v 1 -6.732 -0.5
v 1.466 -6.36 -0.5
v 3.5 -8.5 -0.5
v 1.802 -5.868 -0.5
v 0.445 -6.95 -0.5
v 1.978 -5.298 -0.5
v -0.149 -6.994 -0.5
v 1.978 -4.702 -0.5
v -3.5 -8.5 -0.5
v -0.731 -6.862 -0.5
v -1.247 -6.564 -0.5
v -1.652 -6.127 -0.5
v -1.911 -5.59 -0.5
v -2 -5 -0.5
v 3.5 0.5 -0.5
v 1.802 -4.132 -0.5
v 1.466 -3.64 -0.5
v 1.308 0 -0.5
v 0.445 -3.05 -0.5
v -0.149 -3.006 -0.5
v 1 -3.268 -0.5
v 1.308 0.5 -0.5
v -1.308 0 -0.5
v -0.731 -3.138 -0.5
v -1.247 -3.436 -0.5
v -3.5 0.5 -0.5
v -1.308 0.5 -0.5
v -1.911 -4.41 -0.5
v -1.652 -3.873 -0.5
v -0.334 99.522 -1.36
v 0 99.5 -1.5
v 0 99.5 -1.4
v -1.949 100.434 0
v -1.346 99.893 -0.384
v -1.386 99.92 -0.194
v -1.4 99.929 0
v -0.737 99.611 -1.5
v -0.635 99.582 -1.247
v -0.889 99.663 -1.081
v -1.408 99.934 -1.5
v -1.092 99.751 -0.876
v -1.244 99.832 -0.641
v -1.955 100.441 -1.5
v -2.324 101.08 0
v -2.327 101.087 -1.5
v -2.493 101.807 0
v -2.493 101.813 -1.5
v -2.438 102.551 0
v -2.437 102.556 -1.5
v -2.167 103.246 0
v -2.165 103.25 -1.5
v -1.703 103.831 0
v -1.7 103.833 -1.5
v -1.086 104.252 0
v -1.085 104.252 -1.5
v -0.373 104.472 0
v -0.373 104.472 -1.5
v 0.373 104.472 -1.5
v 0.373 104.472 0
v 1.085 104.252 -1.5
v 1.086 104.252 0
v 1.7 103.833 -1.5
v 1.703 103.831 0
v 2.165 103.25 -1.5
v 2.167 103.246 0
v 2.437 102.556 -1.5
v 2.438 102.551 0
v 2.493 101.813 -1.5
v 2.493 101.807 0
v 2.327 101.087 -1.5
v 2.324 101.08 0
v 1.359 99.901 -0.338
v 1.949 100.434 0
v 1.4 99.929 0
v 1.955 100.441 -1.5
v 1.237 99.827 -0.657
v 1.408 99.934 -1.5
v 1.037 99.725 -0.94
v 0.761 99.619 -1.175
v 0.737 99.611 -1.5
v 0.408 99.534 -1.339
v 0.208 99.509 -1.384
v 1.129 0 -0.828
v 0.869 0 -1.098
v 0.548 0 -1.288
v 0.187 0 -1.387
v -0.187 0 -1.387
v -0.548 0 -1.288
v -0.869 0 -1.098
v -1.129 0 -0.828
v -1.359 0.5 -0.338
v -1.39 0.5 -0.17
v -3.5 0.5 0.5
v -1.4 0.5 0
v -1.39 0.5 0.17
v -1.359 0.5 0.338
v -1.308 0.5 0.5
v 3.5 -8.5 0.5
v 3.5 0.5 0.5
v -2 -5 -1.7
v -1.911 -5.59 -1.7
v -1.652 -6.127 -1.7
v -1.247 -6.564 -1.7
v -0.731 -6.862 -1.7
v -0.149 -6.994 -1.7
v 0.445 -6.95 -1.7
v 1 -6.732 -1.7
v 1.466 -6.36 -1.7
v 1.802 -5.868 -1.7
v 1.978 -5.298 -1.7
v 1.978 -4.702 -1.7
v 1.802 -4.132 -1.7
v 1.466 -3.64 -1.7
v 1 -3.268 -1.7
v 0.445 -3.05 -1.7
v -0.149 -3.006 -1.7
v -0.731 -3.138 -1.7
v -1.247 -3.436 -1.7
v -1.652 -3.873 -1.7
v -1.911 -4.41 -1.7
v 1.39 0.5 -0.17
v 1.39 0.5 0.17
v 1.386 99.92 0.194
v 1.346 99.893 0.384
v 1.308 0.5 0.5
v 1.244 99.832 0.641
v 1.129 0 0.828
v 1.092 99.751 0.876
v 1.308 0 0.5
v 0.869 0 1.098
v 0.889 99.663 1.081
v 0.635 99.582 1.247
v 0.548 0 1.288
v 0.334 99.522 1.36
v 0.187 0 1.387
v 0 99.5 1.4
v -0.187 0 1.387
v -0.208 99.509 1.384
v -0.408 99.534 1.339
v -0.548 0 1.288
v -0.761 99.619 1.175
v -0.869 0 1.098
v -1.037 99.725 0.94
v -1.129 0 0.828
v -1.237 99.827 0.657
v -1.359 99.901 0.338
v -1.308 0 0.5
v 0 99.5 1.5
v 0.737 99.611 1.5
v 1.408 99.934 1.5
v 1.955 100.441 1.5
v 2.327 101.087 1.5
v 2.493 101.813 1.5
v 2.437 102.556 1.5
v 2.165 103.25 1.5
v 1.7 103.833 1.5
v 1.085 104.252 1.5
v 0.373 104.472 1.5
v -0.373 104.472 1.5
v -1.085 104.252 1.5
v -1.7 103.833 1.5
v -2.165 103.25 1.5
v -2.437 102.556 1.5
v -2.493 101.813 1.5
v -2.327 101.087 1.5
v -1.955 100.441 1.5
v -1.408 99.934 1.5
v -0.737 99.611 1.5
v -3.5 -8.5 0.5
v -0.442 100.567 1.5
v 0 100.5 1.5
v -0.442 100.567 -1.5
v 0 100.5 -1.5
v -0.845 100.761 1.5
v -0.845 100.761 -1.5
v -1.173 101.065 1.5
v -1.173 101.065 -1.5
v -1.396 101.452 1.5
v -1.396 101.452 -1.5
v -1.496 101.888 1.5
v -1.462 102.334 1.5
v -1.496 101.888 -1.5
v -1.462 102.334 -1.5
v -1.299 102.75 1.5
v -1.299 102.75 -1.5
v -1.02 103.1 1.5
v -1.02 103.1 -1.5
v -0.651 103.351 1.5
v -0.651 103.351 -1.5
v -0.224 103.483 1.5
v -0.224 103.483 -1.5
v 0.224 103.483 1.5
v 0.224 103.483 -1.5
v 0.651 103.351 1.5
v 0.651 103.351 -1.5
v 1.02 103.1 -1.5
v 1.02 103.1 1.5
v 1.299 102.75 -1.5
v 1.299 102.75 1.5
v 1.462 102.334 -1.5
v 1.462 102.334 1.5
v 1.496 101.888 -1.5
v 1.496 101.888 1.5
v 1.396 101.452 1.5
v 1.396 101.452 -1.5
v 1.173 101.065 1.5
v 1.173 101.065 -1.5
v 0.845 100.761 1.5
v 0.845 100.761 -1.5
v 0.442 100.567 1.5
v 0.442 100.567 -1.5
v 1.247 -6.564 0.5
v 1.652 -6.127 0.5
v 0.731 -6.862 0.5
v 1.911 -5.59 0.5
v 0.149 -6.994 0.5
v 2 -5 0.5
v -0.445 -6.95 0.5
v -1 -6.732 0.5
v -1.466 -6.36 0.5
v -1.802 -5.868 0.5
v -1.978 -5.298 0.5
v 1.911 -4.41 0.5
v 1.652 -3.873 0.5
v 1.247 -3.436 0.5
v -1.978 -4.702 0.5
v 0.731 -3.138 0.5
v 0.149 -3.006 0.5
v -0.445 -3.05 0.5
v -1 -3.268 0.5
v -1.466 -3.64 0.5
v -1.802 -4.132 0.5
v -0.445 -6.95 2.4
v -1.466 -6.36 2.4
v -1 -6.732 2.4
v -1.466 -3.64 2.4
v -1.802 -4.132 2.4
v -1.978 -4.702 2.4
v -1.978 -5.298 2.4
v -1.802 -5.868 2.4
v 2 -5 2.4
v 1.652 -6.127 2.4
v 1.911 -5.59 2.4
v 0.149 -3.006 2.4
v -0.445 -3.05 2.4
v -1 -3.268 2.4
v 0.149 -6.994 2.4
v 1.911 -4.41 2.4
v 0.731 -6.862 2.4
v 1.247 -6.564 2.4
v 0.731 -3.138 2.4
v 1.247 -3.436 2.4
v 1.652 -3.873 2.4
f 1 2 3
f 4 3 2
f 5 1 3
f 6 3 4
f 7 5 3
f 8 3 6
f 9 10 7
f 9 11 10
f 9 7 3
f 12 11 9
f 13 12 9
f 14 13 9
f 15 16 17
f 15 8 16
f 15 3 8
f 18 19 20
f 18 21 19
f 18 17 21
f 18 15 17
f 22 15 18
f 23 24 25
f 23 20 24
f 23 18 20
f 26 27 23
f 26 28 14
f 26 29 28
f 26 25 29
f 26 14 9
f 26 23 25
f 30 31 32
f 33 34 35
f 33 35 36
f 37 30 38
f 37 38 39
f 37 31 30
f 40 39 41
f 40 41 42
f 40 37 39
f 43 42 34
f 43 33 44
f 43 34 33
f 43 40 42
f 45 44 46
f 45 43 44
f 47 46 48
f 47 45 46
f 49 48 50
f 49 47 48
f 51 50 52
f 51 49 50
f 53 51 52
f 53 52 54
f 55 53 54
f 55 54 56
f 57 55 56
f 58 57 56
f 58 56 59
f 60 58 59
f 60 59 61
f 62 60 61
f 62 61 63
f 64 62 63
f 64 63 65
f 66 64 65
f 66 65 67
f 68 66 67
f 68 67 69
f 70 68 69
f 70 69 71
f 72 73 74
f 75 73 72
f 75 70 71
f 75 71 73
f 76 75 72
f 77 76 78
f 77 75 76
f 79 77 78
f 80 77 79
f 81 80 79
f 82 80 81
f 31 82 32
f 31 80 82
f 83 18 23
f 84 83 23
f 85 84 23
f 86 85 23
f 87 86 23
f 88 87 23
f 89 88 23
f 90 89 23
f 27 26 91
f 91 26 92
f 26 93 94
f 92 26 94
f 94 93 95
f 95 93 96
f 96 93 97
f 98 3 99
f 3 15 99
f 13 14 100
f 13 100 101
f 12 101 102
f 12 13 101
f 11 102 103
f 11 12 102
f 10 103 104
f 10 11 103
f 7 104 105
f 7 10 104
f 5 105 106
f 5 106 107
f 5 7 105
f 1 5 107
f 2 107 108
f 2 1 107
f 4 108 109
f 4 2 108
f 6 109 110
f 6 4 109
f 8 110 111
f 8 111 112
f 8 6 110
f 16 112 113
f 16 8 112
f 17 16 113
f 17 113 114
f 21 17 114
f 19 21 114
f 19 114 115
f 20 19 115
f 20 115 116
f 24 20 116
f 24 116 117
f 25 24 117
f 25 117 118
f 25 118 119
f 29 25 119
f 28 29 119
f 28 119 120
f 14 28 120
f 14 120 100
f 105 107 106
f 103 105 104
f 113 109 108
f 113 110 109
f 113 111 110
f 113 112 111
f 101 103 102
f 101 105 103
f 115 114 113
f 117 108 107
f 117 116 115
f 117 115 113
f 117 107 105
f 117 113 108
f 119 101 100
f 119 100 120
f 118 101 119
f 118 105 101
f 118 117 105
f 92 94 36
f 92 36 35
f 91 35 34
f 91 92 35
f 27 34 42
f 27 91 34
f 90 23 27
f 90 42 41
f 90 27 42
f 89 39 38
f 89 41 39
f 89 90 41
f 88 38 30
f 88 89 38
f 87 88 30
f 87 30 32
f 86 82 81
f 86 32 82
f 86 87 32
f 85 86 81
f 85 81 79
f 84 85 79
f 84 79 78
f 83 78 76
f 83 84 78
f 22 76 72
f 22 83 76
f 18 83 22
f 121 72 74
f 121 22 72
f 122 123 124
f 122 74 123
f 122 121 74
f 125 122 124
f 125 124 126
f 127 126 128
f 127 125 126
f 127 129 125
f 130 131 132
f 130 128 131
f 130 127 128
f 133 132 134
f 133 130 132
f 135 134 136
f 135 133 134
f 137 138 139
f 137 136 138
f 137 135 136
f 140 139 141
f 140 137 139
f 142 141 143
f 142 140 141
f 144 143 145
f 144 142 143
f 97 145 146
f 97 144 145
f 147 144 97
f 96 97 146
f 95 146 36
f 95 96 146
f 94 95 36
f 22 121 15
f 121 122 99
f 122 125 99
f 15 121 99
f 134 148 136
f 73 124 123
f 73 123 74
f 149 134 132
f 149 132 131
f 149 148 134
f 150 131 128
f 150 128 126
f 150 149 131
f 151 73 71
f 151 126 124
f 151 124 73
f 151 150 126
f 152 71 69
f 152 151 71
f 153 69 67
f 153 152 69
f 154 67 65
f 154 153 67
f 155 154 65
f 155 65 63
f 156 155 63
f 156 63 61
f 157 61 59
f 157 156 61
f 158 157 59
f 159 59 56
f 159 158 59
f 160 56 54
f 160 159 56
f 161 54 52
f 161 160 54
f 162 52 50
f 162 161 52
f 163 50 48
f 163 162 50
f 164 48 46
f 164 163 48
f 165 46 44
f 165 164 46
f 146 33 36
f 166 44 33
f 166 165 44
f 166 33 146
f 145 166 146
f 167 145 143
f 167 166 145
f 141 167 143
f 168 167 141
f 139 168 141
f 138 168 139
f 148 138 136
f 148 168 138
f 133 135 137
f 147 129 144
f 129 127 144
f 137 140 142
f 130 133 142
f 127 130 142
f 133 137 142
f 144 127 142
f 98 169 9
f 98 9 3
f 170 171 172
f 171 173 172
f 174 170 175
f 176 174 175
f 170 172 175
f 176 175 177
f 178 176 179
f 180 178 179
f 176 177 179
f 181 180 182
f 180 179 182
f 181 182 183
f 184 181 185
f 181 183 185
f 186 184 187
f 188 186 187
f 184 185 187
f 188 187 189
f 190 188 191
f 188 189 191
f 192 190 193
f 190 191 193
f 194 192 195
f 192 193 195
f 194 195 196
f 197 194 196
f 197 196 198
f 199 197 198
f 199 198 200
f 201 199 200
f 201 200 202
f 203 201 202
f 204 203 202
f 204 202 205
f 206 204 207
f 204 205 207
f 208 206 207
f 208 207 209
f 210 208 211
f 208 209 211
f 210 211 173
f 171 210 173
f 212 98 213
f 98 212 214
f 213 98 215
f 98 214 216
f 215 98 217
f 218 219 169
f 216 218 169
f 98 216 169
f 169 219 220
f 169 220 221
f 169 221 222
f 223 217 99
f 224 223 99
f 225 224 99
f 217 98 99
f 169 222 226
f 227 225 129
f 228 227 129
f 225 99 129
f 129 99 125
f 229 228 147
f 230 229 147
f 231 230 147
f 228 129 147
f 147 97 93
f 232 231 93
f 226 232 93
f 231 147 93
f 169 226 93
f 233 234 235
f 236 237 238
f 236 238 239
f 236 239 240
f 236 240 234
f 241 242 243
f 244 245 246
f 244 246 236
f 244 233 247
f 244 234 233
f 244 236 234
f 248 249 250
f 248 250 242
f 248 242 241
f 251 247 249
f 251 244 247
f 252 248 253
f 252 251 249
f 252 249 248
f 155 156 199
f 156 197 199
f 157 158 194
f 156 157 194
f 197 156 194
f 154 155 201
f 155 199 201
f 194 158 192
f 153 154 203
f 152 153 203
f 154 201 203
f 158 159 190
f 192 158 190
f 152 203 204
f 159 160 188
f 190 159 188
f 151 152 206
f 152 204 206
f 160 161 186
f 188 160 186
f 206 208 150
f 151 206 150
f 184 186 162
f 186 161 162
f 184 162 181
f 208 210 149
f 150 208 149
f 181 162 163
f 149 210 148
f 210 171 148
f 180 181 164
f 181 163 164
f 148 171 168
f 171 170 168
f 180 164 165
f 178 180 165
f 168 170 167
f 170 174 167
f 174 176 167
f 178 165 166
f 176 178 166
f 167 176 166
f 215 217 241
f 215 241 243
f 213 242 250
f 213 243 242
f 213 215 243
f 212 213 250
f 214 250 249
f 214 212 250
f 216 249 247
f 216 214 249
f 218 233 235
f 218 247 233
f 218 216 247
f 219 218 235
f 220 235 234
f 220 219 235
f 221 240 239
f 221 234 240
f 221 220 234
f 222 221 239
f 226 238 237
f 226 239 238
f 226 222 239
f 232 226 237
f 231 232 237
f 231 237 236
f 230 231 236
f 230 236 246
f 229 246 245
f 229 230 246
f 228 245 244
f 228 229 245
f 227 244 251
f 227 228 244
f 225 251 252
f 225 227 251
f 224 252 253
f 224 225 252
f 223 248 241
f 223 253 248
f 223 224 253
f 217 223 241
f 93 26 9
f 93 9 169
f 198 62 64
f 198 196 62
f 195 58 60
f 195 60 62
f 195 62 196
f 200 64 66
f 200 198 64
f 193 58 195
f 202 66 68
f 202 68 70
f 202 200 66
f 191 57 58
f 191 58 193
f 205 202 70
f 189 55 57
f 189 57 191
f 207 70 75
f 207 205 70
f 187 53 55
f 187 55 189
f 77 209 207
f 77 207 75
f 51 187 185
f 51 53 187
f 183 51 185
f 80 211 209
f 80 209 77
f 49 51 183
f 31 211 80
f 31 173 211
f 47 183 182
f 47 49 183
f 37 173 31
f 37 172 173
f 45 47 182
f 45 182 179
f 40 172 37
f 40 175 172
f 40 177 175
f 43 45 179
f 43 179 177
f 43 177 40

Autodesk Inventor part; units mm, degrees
ref_plane "YZ Plane" through (0, 0, 0) normal (1, 0, 0) x (0, 1, 0)
sketch "Sketch1" plane through (0, 0, 0) normal (0, 1, 0) x (-1, 0, 0)
  circle A0 centre (0, 0) radius 1.4
  dimension "d0" = 2.8
extrude "Extrusion1" add sketch "Sketch1" along normal blind 100
ref_plane "Work Plane1" through (0, 99.5, 0) normal (0, 1, 0) x (1, 0, 0)
sketch "Sketch2" plane through (0, 99.5, 0) normal (0, 1, 0) x (1, 0, 0)
  line L0 (0, 0) -> (0, -1.5)
  line L1 (0, 0) -> (0, 1.5)
  dimension "d4" = 1.5
  dimension "d5" = 1.5
sketch "Sketch3" plane through (0, 0, 0) normal (1, 0, 0) x (0, 1, 0)
  line L0 (99.5, 0) -> (99.5, 1.5) projected
  line L1 (99.5, 0) -> (99.5, -1.5) projected
  line L2 (99.5, 1.5) -> (100.5, 1.5)
  line L3 (100.5, 1.5) -> (100.5, -1.5)
  line L4 (100.5, -1.5) -> (99.5, -1.5)
  line L5 (102, 1.659) -> (102, -3.2084)
  point P0 (0, 0)
  dimension "d6" = 1
  dimension "d7" = 2.5
revolve "Revolution1" add sketch "Sketch3" angle 360 about axis through (0, 102, 1.659) along (0, 0, -1)
ref_plane "Work Plane2" through (0, 0.5, 0) normal (0, -1, 0) x (1, 0, 0)
sketch "Sketch4" plane through (0, 0.5, 0) normal (0, -1, 0) x (1, 0, 0)
  line L0 (0, 0) -> (0, -2.1121)
  line L1 (3.5, -0.5) -> (3.5, 0.5)
  line L2 (3.5, 0.5) -> (0, 0.5)
  line L3 (3.5, -0.5) -> (0, -0.5)
  line L4 (-3.5, -0.5) -> (-3.5, 0.5)
  line L5 (-3.5, 0.5) -> (0, 0.5)
  line L6 (-3.5, -0.5) -> (0, -0.5)
  dimension "d12" = 3.5
  dimension "d13" = 1
extrude "Extrusion2" add sketch "Sketch4" along normal blind 9
sketch "Sketch5" plane through (3.5, 0.5, -0.5) normal (0, 0, -1) x (-1, 0, 0)
  line L0 (3.5, -0.5) -> (3.5, -9)
  line L1 (7, -9) -> (0, -9) projected
  line L2 (3.5, -9) -> (3.5, -5.5)
  line L3 (3.5, -9) -> (3.5, -9.0551)
  circle A0 centre (3.5, -5.5) radius 2
  dimension "d16" = 3.5
  dimension "d17" = 4
extrude "Extrusion3" add sketch "Sketch5" along normal blind 1.2
sketch "Sketch6" plane through (-3.5, 0.5, 0.5) normal (0, 0, 1) x (1, 0, 0)
  circle A0 centre (3.5, -5.5) radius 2 projected
  point P0 (3.5, -0.5)
extrude "Extrusion4" add sketch "Sketch6" along normal blind 1.9
properties part number "101-05" material "Aluminum 6061"
